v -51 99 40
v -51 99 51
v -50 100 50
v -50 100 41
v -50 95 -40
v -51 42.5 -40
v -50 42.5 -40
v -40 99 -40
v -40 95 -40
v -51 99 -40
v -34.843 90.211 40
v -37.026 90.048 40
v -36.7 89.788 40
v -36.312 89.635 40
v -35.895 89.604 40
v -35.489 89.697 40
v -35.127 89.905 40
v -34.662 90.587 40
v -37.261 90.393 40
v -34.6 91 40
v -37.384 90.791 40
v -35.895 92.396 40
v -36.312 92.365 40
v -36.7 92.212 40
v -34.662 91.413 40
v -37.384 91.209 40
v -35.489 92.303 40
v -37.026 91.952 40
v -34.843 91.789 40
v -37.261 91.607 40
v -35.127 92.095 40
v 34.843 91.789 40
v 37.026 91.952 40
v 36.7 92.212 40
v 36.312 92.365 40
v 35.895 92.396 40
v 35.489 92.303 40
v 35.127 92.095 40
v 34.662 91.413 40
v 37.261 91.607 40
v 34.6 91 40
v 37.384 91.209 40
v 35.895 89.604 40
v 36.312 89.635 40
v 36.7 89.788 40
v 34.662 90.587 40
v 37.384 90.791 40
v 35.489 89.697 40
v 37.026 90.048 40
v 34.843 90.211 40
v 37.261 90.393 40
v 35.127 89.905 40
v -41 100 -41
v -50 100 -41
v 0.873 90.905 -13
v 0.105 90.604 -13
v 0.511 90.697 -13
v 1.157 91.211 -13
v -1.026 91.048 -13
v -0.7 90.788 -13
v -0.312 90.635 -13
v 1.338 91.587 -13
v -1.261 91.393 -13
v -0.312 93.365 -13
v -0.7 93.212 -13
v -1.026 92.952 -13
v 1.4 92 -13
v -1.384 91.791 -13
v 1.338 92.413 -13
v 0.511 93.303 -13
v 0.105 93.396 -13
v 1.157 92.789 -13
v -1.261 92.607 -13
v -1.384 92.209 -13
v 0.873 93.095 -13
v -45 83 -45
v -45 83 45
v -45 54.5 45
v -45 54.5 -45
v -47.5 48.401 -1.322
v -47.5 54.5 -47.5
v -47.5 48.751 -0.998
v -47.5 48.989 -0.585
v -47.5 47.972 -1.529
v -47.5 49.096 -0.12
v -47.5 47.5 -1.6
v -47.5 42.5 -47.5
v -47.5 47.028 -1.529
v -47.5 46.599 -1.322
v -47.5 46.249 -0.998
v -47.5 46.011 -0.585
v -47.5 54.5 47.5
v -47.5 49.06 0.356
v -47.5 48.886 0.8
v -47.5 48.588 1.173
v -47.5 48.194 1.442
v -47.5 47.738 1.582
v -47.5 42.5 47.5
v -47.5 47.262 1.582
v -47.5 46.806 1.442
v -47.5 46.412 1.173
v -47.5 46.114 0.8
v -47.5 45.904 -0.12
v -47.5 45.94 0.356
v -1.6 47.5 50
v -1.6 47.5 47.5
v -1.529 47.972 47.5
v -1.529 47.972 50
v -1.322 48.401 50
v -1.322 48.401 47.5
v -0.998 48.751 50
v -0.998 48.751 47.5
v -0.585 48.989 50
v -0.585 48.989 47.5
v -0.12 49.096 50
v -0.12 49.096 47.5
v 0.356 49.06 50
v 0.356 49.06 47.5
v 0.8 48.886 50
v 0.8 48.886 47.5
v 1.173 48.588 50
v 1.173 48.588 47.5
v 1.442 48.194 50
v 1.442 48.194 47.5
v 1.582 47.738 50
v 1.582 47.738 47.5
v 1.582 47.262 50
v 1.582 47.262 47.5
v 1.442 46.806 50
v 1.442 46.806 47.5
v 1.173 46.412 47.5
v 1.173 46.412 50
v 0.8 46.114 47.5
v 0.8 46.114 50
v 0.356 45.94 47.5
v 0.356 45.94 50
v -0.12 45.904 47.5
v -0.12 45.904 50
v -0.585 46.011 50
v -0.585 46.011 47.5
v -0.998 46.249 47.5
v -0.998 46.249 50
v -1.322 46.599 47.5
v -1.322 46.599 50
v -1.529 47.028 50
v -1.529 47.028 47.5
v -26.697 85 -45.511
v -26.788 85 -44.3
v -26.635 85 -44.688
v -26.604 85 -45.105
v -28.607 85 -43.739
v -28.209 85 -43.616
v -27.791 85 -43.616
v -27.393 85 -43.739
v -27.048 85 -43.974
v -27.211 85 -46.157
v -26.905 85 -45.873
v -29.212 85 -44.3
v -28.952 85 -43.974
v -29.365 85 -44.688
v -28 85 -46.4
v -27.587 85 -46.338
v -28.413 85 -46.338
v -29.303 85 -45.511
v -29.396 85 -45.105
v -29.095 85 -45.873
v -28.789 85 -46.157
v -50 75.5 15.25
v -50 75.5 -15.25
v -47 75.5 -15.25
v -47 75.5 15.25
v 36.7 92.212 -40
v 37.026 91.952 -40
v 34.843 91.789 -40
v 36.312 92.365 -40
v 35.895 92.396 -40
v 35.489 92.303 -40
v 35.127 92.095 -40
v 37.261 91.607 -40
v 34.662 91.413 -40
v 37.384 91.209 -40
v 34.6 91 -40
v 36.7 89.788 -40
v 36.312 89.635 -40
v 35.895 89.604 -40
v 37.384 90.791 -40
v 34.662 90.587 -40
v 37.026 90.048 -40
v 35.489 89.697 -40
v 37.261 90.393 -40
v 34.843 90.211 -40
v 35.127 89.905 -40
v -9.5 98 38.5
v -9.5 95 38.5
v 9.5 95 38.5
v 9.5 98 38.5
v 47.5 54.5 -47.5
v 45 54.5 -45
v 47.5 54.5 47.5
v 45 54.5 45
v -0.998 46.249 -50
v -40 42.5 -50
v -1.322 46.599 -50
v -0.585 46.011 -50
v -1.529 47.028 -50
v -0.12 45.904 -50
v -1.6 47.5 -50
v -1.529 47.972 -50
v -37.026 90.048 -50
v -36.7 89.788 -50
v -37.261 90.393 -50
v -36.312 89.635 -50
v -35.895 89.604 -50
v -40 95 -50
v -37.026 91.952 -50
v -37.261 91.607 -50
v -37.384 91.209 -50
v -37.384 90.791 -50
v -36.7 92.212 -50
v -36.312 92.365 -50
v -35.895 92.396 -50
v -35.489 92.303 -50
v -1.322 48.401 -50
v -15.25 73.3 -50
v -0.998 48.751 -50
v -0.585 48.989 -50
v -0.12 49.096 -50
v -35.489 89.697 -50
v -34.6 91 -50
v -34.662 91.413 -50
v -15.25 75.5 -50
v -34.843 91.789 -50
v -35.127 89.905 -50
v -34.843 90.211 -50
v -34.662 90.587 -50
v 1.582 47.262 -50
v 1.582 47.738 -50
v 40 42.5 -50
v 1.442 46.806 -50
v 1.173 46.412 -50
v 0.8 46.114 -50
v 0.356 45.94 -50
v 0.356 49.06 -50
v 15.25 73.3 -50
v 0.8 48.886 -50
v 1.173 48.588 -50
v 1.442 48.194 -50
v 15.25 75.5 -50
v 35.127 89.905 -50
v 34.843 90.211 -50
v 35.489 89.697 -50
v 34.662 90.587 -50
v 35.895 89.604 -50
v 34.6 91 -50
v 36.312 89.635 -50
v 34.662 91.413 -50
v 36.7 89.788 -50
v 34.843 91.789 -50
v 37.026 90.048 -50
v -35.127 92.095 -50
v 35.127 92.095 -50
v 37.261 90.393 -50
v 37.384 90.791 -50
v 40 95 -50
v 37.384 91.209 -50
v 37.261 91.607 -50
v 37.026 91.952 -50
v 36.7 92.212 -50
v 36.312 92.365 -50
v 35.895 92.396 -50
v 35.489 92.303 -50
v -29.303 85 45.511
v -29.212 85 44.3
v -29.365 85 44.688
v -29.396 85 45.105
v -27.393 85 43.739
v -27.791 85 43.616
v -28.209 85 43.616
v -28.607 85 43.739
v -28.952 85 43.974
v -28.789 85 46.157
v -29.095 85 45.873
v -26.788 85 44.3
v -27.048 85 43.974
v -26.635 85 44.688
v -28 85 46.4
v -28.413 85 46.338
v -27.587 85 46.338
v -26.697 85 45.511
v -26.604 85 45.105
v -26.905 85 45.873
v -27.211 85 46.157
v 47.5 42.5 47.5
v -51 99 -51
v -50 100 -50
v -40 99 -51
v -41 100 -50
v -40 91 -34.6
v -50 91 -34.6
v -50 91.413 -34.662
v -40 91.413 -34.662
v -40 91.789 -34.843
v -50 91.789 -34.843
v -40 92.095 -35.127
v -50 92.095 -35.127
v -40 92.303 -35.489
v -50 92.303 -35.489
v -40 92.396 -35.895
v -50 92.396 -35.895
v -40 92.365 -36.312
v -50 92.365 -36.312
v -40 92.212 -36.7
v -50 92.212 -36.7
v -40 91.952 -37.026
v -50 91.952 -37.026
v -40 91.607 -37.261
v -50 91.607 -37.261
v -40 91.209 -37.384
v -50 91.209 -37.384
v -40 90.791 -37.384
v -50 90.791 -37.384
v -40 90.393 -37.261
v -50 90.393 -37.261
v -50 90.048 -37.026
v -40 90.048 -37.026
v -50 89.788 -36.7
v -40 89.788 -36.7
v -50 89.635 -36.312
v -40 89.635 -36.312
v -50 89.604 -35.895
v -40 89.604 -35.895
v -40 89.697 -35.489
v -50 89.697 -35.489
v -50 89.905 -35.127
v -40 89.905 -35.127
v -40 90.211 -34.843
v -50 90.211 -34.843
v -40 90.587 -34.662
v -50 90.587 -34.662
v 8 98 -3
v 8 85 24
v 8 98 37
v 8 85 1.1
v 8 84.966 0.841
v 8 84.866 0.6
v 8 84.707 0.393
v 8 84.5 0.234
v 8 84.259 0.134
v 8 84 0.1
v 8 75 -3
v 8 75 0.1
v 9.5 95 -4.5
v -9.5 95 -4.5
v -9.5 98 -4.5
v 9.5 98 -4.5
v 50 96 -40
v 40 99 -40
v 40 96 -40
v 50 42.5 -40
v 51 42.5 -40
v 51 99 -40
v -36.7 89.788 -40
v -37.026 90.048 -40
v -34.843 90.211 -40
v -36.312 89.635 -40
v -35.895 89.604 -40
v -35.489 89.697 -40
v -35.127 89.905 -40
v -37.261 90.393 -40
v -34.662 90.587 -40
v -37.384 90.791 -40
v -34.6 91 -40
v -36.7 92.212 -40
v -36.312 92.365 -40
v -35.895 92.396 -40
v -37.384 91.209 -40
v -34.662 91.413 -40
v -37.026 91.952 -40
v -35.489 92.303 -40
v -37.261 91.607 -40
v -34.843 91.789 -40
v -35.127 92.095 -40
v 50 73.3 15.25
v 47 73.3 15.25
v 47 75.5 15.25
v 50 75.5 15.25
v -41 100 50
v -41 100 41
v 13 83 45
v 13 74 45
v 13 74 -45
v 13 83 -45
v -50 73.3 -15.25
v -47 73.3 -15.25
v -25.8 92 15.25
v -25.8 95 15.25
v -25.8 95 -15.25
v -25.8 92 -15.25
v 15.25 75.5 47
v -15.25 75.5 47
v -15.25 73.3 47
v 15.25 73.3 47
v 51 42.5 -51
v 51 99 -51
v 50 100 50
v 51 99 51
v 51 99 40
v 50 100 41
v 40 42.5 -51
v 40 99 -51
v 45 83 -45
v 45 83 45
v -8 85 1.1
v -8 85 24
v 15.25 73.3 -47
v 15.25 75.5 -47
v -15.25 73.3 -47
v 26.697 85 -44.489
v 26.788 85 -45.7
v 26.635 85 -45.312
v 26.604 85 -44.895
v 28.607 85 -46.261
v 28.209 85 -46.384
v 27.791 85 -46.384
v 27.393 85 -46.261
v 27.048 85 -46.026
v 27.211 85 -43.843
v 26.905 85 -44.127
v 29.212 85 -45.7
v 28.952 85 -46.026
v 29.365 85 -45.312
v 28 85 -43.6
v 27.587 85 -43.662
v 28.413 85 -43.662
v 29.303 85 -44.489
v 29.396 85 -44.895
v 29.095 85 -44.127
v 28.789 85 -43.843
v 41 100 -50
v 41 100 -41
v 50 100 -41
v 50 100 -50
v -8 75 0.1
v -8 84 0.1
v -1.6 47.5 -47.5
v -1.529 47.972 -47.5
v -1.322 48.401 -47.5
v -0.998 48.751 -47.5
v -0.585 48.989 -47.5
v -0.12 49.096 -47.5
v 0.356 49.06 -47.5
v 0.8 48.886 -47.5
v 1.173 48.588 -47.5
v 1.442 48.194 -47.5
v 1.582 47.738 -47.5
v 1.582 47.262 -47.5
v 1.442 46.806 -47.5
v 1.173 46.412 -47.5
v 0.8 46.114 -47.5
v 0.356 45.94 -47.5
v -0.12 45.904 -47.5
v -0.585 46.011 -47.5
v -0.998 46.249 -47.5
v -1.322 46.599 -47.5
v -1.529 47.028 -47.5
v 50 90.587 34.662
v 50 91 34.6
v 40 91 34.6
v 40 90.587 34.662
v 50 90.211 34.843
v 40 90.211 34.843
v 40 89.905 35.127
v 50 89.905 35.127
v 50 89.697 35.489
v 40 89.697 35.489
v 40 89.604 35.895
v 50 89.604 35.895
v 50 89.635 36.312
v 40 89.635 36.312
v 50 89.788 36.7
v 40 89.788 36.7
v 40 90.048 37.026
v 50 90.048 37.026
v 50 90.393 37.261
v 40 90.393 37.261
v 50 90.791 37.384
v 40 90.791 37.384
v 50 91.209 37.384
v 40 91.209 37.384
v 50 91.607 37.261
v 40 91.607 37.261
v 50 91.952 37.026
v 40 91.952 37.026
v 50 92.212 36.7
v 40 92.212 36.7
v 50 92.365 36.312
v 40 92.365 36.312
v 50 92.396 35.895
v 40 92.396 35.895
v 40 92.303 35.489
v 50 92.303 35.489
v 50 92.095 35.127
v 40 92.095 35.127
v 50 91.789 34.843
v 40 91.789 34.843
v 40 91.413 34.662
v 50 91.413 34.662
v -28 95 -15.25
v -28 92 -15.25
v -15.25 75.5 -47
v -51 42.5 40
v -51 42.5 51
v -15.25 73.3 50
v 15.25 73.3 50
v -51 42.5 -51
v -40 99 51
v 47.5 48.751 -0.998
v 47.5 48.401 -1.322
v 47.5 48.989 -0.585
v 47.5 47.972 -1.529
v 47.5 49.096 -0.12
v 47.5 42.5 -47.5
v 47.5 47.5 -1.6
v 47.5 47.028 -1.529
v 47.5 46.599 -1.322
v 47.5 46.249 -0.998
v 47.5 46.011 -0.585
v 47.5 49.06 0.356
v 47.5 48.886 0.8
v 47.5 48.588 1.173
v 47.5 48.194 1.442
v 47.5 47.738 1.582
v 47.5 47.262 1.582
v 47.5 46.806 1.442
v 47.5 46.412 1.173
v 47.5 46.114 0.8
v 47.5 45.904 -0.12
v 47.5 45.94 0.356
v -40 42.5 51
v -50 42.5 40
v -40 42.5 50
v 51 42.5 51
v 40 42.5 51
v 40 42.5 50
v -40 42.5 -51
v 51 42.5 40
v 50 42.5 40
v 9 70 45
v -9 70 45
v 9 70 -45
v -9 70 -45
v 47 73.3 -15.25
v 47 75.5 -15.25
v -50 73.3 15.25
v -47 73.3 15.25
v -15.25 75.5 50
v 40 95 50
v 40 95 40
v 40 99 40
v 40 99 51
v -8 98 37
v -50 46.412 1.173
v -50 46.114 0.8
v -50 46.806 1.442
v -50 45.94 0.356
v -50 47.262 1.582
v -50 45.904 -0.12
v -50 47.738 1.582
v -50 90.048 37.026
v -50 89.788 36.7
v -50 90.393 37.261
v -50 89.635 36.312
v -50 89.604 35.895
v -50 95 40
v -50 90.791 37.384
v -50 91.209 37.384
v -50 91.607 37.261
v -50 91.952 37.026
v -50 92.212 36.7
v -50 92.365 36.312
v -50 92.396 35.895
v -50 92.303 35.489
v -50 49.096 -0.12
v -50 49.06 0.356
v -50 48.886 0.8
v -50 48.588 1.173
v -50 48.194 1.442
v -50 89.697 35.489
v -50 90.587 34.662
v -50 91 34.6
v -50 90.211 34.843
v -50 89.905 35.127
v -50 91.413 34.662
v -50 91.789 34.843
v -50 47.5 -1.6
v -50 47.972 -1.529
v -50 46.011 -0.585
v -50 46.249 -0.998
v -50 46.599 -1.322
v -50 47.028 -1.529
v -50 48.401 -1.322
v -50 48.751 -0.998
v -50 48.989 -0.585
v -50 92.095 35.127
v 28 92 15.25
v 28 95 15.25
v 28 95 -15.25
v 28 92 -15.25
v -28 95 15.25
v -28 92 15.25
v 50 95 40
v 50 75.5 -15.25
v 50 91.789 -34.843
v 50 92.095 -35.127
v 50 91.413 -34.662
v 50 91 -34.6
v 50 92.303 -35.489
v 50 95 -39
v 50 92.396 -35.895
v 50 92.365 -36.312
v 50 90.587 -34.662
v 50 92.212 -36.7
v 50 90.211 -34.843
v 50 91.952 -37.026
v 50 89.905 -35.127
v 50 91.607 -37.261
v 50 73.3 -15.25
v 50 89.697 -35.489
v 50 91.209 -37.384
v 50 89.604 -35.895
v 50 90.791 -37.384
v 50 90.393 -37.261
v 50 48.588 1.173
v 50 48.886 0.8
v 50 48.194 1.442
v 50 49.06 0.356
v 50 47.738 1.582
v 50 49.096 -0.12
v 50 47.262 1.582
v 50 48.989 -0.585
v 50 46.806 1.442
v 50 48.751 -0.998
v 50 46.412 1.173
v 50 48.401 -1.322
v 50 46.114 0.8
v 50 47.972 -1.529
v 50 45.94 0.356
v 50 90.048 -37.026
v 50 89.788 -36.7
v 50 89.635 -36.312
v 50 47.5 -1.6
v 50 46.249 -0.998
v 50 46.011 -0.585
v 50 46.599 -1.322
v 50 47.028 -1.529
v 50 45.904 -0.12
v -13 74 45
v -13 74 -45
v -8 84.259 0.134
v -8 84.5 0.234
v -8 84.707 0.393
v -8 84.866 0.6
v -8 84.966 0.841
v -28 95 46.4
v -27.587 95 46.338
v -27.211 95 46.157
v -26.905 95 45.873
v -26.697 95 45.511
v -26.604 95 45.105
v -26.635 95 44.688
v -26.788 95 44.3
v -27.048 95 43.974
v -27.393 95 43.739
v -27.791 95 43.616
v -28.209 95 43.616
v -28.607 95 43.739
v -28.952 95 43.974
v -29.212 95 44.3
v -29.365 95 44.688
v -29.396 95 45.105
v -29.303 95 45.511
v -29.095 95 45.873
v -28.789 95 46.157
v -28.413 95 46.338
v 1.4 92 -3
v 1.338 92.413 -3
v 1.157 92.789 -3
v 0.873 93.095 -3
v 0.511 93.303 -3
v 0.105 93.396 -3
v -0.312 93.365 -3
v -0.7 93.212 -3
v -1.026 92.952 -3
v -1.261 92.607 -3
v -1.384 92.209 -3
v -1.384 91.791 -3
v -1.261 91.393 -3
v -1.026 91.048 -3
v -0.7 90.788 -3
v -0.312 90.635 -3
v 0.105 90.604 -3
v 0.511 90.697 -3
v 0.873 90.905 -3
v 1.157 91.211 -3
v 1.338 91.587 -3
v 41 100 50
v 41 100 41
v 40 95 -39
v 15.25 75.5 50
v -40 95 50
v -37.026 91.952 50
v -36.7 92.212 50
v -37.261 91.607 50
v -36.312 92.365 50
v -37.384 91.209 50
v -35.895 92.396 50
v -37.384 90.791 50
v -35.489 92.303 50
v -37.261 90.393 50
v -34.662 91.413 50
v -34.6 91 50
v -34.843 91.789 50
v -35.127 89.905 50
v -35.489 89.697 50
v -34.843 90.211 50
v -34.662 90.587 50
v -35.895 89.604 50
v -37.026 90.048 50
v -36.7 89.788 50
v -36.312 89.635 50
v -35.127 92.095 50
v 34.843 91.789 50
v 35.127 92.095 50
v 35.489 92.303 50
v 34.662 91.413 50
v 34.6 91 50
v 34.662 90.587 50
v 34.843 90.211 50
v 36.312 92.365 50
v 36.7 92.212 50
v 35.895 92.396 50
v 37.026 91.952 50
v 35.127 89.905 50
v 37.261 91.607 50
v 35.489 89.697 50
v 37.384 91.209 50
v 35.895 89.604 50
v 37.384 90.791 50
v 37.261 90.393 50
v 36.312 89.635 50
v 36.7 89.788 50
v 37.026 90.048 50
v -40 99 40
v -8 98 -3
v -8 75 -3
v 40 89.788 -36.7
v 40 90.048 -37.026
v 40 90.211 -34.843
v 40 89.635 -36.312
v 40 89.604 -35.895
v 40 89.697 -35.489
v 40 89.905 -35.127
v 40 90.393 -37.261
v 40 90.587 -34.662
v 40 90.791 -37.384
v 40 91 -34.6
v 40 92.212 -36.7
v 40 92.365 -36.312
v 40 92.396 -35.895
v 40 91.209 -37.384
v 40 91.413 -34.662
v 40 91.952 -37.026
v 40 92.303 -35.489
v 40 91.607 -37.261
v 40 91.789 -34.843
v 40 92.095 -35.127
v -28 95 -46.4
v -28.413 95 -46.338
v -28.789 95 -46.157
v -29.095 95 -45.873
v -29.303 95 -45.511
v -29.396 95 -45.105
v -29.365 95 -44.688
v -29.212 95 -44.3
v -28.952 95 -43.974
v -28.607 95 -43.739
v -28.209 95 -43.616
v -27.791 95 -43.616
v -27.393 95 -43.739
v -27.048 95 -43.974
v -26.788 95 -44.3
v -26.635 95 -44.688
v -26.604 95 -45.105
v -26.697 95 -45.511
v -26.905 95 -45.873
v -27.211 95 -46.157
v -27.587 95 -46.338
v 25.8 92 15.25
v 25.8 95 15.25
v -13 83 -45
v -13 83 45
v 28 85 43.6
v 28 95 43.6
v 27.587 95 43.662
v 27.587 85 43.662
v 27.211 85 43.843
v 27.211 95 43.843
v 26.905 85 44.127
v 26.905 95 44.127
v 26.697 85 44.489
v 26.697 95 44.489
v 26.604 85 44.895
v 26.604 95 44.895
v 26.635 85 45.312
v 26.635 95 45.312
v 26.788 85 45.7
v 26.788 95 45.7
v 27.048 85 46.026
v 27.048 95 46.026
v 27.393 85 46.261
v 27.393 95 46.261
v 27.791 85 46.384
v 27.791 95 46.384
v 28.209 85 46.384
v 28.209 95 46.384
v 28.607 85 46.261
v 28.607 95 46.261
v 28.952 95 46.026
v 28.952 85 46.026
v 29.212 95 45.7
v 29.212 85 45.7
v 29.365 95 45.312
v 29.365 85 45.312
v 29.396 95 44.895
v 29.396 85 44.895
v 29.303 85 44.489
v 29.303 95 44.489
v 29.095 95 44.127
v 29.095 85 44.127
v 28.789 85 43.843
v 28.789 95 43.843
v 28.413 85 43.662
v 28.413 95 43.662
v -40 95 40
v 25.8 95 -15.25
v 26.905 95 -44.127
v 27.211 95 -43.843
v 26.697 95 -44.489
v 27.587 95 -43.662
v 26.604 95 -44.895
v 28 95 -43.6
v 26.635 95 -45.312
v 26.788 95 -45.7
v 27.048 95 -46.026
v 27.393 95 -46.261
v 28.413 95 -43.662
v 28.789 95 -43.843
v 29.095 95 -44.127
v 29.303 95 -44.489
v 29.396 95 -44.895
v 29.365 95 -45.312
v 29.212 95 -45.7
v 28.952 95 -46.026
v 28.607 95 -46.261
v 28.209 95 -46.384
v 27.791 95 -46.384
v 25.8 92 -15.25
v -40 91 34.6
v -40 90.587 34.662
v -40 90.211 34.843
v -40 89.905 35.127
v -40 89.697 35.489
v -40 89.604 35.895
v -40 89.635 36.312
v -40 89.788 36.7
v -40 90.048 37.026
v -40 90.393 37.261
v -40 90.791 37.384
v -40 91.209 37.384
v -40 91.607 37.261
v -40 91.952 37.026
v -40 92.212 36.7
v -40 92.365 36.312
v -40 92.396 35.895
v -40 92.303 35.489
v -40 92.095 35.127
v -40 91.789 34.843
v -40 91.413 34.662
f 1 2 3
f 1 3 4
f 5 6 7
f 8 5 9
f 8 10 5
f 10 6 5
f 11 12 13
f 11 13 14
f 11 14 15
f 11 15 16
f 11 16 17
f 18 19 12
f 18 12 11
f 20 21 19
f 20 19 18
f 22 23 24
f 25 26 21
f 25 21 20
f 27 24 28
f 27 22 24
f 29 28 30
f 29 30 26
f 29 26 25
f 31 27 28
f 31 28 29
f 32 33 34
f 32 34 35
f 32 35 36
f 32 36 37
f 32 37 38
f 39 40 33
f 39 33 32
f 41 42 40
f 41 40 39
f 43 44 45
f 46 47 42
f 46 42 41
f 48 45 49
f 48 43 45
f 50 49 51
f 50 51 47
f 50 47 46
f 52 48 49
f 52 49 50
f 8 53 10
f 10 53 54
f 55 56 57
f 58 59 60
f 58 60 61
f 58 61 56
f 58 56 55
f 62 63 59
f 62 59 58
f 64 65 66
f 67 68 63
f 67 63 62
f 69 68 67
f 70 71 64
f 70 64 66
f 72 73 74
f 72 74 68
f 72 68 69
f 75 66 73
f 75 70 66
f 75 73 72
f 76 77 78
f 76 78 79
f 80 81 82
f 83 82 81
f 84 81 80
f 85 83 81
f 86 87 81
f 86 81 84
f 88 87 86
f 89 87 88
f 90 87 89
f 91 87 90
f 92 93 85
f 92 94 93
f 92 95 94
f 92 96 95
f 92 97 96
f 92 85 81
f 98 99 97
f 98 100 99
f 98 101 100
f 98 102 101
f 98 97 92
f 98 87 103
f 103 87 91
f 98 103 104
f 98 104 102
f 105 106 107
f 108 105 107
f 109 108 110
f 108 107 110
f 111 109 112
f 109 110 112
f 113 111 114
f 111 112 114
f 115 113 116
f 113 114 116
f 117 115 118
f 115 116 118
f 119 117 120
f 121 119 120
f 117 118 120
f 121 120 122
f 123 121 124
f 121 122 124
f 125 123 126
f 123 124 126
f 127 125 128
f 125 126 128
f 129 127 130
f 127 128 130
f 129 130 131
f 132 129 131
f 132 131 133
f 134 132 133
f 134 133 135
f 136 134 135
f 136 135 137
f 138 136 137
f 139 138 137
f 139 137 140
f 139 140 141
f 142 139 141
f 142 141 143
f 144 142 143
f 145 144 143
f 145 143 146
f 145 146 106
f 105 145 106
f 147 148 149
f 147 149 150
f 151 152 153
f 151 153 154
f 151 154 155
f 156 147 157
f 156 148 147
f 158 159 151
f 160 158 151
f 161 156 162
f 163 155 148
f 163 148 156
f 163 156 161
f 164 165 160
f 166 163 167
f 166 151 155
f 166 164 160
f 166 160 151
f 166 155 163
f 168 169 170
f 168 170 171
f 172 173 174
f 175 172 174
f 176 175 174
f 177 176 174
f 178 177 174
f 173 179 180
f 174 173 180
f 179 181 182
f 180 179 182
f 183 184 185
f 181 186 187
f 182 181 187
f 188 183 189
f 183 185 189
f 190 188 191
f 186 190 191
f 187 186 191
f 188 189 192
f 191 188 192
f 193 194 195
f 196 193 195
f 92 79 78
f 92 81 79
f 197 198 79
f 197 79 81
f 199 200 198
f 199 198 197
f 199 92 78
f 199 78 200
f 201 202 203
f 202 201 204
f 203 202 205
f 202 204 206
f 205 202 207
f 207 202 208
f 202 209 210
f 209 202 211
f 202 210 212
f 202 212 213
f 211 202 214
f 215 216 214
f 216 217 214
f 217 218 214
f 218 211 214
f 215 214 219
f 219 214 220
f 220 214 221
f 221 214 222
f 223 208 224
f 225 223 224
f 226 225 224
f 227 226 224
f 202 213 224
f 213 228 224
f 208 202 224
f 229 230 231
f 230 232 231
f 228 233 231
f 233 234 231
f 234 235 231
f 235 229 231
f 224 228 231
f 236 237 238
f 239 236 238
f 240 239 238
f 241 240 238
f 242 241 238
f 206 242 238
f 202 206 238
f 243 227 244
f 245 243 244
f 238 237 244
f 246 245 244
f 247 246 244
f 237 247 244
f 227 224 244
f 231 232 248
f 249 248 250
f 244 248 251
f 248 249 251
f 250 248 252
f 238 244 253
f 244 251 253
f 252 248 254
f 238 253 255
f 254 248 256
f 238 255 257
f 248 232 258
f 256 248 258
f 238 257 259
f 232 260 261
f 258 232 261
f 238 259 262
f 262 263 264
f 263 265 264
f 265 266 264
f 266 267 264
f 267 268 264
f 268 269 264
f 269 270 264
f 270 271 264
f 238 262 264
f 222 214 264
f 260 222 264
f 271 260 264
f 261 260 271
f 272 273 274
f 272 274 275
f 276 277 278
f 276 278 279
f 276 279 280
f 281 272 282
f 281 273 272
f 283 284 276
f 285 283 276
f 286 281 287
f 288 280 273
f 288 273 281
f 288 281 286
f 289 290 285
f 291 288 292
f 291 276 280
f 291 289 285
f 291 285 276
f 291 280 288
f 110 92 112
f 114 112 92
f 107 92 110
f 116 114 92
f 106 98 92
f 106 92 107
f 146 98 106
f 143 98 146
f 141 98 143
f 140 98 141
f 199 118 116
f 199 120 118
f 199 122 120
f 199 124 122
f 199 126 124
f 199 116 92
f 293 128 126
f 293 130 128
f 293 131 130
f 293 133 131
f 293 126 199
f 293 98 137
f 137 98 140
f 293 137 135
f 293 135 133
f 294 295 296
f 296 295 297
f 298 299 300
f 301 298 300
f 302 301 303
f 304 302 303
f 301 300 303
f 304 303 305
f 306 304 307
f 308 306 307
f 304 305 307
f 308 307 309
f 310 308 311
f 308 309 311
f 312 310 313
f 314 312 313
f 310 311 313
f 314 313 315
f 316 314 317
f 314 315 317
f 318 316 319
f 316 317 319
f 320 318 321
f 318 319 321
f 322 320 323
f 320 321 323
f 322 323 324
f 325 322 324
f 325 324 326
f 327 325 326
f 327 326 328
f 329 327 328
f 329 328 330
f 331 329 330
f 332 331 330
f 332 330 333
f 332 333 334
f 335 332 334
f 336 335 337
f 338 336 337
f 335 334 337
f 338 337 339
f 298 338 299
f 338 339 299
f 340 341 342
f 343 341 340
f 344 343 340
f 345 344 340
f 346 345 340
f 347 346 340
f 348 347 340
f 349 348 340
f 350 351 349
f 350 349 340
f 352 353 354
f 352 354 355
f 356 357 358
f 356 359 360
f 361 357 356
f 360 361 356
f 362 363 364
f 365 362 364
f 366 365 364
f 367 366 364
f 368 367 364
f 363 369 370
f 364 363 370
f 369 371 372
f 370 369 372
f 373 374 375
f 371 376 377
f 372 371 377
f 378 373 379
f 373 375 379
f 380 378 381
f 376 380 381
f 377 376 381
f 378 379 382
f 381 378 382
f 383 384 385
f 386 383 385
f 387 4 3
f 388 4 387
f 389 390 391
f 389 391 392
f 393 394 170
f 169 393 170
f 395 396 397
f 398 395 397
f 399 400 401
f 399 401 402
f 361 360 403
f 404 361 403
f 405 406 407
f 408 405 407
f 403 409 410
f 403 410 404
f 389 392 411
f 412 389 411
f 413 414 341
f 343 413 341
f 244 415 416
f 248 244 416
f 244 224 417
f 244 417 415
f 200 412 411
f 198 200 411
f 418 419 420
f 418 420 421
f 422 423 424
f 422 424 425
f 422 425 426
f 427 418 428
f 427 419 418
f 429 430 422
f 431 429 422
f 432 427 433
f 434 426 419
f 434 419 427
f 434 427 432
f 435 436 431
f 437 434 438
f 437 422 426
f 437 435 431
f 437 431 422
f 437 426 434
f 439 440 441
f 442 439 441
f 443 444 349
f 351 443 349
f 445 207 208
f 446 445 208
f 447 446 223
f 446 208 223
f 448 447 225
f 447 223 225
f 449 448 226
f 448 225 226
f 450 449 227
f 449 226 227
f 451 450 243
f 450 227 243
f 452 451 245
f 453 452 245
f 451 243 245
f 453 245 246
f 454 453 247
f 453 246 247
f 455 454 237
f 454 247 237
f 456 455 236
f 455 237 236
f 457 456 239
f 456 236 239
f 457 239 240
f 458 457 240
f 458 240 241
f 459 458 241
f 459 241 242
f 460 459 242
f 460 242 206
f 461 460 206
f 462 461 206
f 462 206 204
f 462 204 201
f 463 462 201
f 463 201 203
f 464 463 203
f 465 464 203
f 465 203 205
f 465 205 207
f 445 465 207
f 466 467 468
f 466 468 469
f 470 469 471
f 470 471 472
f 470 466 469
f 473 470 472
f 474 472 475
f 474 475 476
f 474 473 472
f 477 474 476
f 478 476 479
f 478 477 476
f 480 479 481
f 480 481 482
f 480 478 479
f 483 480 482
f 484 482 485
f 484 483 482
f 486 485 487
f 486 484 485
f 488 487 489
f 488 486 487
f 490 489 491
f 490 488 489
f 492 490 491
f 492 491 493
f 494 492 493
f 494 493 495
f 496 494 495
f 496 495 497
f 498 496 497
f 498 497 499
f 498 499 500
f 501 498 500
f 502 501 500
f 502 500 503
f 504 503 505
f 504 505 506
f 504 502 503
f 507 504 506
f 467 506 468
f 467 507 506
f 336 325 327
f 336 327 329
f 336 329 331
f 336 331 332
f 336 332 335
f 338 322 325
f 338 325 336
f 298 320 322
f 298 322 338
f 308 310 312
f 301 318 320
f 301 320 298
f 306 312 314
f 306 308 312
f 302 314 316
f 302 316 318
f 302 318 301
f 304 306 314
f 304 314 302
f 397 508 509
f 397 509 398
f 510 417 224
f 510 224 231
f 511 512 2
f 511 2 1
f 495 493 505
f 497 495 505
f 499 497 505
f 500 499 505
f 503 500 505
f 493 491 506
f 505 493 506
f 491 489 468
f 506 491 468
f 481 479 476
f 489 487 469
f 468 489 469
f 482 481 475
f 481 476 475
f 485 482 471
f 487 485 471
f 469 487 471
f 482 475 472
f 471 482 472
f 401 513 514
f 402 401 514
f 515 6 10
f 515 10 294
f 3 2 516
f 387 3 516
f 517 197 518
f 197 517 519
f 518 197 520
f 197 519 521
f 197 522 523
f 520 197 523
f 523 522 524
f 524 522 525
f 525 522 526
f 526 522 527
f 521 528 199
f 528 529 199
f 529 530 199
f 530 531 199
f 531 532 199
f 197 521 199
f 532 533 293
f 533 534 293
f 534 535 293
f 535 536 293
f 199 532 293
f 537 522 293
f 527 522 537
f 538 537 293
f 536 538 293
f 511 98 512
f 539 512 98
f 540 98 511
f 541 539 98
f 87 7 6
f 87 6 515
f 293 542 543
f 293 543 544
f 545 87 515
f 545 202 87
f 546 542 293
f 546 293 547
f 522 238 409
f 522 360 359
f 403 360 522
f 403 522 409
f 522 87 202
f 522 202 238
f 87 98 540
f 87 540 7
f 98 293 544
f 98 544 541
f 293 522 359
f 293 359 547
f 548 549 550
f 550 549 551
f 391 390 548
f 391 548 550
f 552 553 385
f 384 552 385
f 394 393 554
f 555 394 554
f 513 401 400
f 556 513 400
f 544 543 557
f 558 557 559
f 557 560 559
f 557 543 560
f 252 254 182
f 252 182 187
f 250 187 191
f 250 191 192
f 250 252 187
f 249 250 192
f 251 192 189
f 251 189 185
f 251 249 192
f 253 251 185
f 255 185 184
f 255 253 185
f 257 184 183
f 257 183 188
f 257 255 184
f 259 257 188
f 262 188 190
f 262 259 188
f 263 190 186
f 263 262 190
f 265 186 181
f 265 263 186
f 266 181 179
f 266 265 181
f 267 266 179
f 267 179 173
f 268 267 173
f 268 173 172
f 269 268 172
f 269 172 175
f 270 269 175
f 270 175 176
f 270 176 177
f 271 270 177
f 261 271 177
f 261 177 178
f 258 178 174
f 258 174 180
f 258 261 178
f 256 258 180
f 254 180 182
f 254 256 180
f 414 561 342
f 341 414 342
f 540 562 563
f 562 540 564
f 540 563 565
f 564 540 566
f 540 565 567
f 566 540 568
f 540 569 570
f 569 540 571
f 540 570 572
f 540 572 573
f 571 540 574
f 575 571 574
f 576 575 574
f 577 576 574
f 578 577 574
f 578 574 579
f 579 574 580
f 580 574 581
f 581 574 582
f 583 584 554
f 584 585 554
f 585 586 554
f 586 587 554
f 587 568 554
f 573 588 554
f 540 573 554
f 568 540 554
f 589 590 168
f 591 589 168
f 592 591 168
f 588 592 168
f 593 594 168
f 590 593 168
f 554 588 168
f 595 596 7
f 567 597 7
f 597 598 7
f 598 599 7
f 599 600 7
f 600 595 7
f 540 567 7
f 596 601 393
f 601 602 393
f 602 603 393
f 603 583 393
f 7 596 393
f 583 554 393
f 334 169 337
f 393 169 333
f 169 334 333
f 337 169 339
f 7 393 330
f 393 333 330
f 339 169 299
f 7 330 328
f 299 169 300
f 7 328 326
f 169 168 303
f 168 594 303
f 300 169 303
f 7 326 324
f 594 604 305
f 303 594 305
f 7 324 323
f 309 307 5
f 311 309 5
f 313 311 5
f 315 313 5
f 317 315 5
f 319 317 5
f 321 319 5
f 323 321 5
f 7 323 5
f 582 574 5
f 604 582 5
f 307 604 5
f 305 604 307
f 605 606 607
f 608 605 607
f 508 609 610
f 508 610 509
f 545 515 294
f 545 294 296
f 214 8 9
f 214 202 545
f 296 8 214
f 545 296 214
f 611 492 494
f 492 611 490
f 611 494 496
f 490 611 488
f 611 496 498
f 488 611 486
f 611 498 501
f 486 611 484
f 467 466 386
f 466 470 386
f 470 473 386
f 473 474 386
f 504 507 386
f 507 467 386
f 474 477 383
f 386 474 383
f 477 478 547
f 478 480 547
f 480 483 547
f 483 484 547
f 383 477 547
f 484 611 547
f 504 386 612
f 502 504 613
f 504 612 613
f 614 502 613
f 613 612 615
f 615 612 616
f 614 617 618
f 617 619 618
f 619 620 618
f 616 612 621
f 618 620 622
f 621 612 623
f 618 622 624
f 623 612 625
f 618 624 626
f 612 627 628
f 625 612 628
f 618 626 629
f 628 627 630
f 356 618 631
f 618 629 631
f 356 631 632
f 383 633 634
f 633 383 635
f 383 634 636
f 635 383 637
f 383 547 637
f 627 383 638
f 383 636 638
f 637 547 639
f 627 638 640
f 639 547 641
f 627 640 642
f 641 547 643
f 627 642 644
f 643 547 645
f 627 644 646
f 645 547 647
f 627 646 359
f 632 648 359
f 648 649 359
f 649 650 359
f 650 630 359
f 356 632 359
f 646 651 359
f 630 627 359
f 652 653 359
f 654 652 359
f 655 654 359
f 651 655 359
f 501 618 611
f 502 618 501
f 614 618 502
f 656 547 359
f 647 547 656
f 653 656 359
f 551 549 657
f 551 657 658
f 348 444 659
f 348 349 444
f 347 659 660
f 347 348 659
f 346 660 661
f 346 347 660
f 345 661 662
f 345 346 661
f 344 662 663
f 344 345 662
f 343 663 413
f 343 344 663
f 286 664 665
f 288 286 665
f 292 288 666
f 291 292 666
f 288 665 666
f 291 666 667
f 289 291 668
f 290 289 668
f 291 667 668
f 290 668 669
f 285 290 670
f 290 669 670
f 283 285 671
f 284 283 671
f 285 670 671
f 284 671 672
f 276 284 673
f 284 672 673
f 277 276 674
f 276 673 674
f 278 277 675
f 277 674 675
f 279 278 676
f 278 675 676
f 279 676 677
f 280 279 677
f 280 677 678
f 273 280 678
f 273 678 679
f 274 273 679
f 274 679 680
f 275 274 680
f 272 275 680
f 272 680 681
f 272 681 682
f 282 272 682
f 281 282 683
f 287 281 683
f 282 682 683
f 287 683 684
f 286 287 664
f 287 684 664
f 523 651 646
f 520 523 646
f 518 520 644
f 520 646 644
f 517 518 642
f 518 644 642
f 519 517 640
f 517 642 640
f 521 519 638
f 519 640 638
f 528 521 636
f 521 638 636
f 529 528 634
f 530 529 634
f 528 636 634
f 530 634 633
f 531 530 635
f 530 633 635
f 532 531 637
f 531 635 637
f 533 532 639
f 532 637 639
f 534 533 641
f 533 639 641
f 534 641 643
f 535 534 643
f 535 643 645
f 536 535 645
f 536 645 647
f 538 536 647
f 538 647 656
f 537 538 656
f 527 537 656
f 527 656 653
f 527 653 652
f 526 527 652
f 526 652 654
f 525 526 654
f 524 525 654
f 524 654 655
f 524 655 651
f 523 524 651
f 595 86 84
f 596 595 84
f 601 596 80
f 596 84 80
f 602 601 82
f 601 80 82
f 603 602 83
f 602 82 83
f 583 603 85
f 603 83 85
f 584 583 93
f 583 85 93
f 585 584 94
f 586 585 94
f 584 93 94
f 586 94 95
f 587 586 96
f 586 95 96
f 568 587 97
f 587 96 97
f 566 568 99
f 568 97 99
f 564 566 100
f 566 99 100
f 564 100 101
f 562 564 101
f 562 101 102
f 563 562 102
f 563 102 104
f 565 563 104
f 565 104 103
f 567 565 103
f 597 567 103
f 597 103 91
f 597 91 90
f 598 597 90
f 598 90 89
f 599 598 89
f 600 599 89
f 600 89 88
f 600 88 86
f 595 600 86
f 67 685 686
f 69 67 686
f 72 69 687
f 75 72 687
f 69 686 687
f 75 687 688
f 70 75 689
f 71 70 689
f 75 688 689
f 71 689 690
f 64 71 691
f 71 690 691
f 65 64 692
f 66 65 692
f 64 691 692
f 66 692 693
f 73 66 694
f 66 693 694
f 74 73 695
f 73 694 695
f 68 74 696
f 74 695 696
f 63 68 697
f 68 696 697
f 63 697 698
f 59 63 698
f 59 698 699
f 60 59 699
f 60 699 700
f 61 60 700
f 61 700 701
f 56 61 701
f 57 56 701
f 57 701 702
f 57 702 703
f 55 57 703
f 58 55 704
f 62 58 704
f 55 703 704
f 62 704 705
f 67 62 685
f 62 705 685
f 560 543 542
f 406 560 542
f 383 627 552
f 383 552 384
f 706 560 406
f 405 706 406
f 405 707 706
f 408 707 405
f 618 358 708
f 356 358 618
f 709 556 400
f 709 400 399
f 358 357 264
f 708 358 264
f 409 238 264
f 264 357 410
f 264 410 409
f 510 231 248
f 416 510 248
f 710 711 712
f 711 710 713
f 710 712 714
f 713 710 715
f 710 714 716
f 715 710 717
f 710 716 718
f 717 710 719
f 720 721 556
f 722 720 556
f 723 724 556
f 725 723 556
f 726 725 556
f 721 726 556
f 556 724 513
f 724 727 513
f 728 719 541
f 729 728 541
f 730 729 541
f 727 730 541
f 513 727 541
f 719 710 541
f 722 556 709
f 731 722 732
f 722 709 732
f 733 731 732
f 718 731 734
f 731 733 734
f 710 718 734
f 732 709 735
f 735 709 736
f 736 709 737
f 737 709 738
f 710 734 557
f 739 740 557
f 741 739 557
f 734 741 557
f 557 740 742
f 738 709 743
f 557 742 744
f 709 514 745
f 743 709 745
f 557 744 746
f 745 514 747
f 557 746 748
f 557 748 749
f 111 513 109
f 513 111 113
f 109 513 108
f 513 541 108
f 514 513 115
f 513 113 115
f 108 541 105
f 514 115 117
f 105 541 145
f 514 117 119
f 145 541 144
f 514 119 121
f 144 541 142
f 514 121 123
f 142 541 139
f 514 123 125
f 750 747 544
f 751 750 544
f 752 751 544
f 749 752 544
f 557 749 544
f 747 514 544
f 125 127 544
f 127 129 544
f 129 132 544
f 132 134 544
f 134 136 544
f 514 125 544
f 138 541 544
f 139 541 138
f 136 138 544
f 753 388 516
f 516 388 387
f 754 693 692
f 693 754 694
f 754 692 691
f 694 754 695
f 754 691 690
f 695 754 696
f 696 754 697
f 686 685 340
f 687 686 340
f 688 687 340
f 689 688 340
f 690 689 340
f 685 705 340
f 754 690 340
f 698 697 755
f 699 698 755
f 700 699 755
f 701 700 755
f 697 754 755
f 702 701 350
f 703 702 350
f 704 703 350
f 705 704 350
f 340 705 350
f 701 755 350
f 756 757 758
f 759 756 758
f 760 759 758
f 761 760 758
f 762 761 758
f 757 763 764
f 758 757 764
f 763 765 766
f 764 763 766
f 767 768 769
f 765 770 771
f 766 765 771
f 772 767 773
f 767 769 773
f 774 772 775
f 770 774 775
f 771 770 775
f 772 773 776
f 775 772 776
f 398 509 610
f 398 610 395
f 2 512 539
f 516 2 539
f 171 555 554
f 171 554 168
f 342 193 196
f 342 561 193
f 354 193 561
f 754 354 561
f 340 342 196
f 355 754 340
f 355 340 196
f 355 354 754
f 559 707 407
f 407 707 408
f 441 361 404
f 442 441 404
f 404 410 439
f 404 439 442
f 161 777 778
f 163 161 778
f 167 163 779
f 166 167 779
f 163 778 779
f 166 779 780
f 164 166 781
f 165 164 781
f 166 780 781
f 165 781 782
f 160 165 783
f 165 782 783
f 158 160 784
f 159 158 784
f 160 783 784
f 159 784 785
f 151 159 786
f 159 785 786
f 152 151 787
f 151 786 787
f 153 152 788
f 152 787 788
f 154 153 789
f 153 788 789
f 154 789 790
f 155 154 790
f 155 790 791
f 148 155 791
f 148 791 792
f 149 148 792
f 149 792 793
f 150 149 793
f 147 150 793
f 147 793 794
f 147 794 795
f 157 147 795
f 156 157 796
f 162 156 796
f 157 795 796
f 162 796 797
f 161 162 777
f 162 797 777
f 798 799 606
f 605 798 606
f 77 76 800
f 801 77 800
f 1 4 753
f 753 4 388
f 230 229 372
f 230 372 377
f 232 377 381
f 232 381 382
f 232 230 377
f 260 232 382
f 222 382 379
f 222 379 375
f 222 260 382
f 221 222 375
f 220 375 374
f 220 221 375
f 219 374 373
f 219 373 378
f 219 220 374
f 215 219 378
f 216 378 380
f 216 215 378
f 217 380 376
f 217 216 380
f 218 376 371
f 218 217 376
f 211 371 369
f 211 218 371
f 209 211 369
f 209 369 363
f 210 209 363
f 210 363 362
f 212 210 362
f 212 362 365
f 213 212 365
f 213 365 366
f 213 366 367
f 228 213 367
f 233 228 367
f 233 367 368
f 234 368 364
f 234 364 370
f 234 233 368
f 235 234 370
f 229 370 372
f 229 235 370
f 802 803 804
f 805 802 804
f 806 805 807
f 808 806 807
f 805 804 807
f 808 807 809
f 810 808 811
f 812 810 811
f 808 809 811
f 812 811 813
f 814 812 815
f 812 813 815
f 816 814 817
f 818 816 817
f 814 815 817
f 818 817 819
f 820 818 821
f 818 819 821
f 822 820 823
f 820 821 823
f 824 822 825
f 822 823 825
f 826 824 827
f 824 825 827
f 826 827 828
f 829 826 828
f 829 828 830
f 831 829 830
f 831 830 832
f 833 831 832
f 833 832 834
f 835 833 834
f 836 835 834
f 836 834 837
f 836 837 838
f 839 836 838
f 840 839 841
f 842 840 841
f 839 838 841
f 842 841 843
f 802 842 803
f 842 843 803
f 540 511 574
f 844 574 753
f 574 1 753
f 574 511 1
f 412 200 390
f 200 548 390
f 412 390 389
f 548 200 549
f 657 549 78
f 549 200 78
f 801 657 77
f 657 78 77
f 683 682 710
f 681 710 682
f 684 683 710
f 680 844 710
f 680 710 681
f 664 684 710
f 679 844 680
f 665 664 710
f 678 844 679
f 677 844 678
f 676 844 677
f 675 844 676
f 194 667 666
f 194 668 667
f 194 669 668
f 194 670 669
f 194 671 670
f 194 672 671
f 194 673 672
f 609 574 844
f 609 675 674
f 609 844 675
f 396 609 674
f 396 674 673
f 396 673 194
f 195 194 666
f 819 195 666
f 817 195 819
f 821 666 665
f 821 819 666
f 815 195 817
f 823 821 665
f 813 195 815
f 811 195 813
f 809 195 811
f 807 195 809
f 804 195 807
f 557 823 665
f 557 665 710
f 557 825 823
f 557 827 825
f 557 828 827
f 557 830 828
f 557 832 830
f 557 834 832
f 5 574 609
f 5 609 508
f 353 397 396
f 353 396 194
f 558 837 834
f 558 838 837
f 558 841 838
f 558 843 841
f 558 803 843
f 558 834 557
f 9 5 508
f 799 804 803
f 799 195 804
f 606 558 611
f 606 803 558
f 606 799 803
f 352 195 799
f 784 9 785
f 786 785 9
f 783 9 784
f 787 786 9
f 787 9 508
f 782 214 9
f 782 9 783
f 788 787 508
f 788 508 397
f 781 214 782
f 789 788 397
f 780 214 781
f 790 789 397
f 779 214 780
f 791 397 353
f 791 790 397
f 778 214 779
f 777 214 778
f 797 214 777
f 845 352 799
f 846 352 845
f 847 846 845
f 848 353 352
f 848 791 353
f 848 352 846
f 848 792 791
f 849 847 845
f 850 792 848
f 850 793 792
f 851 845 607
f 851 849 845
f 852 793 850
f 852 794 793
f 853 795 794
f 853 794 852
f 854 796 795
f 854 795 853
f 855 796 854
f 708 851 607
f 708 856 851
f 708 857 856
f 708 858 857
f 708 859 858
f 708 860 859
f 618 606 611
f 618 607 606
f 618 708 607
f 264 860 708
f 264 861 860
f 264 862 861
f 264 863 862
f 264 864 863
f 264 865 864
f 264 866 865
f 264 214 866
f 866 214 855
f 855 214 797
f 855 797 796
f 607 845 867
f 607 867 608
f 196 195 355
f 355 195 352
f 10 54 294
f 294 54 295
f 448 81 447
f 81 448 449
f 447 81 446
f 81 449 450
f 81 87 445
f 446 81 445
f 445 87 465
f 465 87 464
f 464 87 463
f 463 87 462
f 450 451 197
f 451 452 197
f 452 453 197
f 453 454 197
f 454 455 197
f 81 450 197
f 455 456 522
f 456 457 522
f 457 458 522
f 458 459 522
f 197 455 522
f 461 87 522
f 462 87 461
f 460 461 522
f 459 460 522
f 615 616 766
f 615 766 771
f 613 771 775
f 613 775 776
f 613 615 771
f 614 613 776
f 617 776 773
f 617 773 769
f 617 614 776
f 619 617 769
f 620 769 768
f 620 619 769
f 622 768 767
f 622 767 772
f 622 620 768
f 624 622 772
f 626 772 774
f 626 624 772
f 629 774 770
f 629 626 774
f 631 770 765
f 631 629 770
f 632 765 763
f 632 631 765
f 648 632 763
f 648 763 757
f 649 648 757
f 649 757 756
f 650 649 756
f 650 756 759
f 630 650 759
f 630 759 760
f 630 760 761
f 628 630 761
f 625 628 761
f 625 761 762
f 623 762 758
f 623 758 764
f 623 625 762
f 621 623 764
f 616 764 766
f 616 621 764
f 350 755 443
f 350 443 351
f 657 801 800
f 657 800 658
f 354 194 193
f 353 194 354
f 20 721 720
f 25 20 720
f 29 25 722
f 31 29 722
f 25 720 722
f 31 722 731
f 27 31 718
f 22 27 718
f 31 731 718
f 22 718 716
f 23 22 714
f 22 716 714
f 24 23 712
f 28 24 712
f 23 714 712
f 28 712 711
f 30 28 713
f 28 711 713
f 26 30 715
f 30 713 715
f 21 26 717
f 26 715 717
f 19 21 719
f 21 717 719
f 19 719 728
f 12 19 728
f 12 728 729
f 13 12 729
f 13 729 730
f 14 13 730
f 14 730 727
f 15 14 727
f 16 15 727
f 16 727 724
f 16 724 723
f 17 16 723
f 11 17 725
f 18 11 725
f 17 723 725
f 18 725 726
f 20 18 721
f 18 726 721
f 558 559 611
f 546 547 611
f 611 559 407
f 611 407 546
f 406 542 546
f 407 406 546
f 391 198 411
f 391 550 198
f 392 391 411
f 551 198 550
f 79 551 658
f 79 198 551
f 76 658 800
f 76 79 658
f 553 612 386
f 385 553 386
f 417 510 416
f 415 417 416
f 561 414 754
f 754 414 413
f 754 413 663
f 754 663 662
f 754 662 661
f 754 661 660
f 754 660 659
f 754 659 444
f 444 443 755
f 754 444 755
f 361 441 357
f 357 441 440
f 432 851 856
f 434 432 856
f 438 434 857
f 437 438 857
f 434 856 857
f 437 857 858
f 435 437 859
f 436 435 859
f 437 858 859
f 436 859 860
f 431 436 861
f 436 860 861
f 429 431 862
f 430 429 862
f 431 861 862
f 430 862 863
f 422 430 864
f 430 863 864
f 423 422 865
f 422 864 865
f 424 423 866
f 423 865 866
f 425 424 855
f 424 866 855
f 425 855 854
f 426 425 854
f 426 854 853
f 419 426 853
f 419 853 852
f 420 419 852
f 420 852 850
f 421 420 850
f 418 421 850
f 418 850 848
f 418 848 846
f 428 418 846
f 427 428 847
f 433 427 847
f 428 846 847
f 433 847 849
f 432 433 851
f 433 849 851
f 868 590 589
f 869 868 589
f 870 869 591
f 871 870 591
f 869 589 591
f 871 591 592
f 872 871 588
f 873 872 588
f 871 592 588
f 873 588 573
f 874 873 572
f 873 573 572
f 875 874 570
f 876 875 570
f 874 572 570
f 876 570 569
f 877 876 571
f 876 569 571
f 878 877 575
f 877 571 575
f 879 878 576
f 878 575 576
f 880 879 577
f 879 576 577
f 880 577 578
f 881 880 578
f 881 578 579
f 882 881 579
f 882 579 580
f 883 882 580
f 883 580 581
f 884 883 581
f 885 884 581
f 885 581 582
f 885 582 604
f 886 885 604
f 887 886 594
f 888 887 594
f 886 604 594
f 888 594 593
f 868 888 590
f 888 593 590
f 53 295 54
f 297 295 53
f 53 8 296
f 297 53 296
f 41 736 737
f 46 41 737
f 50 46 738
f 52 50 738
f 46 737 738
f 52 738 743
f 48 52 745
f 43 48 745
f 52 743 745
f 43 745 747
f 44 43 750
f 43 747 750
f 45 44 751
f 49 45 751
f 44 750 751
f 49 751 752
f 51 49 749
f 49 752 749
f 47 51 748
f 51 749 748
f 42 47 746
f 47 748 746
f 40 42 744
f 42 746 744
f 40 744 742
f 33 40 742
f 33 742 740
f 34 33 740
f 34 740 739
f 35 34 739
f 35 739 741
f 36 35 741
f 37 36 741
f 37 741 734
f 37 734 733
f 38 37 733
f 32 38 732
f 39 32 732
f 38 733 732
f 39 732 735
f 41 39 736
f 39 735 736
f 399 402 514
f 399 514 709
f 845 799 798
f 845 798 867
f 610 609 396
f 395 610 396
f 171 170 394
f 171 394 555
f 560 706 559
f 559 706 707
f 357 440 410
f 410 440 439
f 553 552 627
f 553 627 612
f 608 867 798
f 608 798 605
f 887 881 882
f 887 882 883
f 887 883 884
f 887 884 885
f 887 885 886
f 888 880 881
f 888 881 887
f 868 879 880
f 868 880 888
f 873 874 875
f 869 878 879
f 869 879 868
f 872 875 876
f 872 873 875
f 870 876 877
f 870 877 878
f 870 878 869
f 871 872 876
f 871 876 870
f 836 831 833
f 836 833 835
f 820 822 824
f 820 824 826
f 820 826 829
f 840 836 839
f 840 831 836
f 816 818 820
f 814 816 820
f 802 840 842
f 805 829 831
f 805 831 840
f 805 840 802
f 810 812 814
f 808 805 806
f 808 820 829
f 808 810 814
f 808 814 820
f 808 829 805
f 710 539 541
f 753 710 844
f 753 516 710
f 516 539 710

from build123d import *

# Parameters (mm, degrees)
SKETCH1_W                       = 100
SKETCH1_H                       = 100
BOSS_EXTRUDE1_DEPTH             = 95
SKETCH2_W                       = 10
SKETCH2_H                       = 10
BOSS_EXTRUDE2_DEPTH             = 105
SKETCH3_R                       = 1.4
CUT_EXTRUDE1_DEPTH              = 10
SKETCH4_W                       = 11
SKETCH4_H                       = 11
BOSS_EXTRUDE3_DEPTH             = 105
SKETCH5_R                       = 1.4
CUT_EXTRUDE2_DEPTH              = 10
SKETCH6_R                       = 1.4
CUT_EXTRUDE3_DEPTH              = 10
CHAMFER1_SIZE                   = 1
SKETCH7_W                       = 19
SKETCH7_H                       = 43
SKETCH7_W_2                     = 16
SKETCH7_H_2                     = 40
BOSS_EXTRUDE4_DEPTH             = 3
SKETCH8_W                       = 16
SKETCH8_H                       = 40
CUT_EXTRUDE4_DEPTH              = 10
CHAMFER2_SIZE                   = 13
SKETCH9_W                       = 16
SKETCH9_H                       = 3.1
CUT_EXTRUDE5_DEPTH              = 10
FILLET1_R                       = 1
SKETCH10_R                      = 1.4
CUT_EXTRUDE6_DEPTH              = 10
SKETCH11_R                      = 5
BOSS_EXTRUDE5_DEPTH             = 3
SKETCH12_W                      = 30.5
SKETCH12_H                      = 2.2
CUT_EXTRUDE7_DEPTH              = 3
SKETCH13_W                      = 30.5
SKETCH13_H                      = 2.2
CUT_EXTRUDE8_DEPTH              = 3
SKETCH14_W                      = 2.2
SKETCH14_H                      = 30.5
CUT_EXTRUDE9_DEPTH              = 3
CUT_EXTRUDE10_DEPTH             = 45
CUT_EXTRUDE10_DEPTH_BACK        = 45
SKETCH15_W                      = 90
SKETCH15_H                      = 58
CUT_EXTRUDE11_REACH             = 125.296
CUT_EXTRUDE11_DIRECTION_2_REACH = 125.296
CHAMFER3_SIZE                   = 4
SKETCH17_W                      = 102
SKETCH17_H                      = 53.035118915
CUT_EXTRUDE12_DEPTH             = 152.673992497
SKETCH19_W                      = 95
SKETCH19_H                      = 95
CUT_EXTRUDE14_DEPTH             = 12
SKETCH20_R                      = 1.6
CUT_EXTRUDE15_DEPTH             = 152.003311222
SKETCH21_R                      = 1.6
CUT_EXTRUDE16_DEPTH             = 152.003311222


with BuildPart() as part:
    # Sketch1 → Boss-Extrude1 (new body)
    with BuildSketch(Plane(origin=(0, 0, 0), x_dir=(1, 0, 0), z_dir=(0, 1, 0))):
        Rectangle(SKETCH1_W, SKETCH1_H)
    extrude(amount=BOSS_EXTRUDE1_DEPTH)

    # Sketch2 → Boss-Extrude2 (add)
    with BuildSketch(Plane(origin=(0, 100, 0), x_dir=(1, 0, 0), z_dir=(0, 1, 0))):
        with Locations((-45, 45)):
            Rectangle(SKETCH2_W, SKETCH2_H)
        with Locations((45, 45)):
            Rectangle(SKETCH2_W, SKETCH2_H)
        with Locations((45, -45)):
            Rectangle(SKETCH2_W, SKETCH2_H)
        with Locations((-45, -45)):
            Rectangle(SKETCH2_W, SKETCH2_H)
    extrude(amount=-BOSS_EXTRUDE2_DEPTH)

    # Sketch3 → Cut-Extrude1 (cut)
    with BuildSketch(Plane(origin=(0, 95, 0), x_dir=(1, 0, 0), z_dir=(0, 1, 0))):
        with Locations(Location((-28, -45, 0), (0, 0, 270))):
            Circle(SKETCH3_R)
        with Locations(Location((28, -45, 0), (0, 0, 90))):
            Circle(SKETCH3_R)
        with Locations(Location((28, 45, 0), (0, 0, 270))):
            Circle(SKETCH3_R)
        with Locations(Location((-28, 45, 0), (0, 0, 90))):
            Circle(SKETCH3_R)
    cut_extrude1 = extrude(amount=-CUT_EXTRUDE1_DEPTH, mode=Mode.SUBTRACT)

    # Sketch4 → Boss-Extrude3 (add)
    with BuildSketch(Plane(origin=(0, 100, 0), x_dir=(1, 0, 0), z_dir=(0, 1, 0))):
        with Locations((-45.5, 45.5)):
            Rectangle(SKETCH4_W, SKETCH4_H)
        with Locations((45.5, 45.5)):
            Rectangle(SKETCH4_W, SKETCH4_H)
        with Locations((45.5, -45.5)):
            Rectangle(SKETCH4_W, SKETCH4_H)
        with Locations((-45.5, -45.5)):
            Rectangle(SKETCH4_W, SKETCH4_H)
    extrude(amount=-BOSS_EXTRUDE3_DEPTH)

    # Sketch5 → Cut-Extrude2 (cut)
    with BuildSketch(Plane.XY.offset(50)):
        with Locations((-36, 91)):
            Circle(SKETCH5_R)
        with Locations(Location((36, 91, 0), (0, 0, 180))):
            Circle(SKETCH5_R)
        with Locations((36, 4)):
            Circle(SKETCH5_R)
        with Locations(Location((-36, 4, 0), (0, 0, 180))):
            Circle(SKETCH5_R)
    cut_extrude2 = extrude(amount=-CUT_EXTRUDE2_DEPTH, mode=Mode.SUBTRACT)

    # Mirror1: Cut-Extrude2 across plane
    add(cut_extrude2.mirror(Plane.XY), mode=Mode.SUBTRACT)

    # Sketch6 → Cut-Extrude3 (cut)
    with BuildSketch(Plane.ZY.offset(50)):
        with Locations((-36, 91)):
            Circle(SKETCH6_R)
        with Locations(Location((36, 91, 0), (0, 0, 180))):
            Circle(SKETCH6_R)
        with Locations((36, 4)):
            Circle(SKETCH6_R)
        with Locations(Location((-36, 4, 0), (0, 0, 180))):
            Circle(SKETCH6_R)
    cut_extrude3 = extrude(amount=-CUT_EXTRUDE3_DEPTH, mode=Mode.SUBTRACT)

    # Mirror2: Cut-Extrude3 across plane
    add(cut_extrude3.mirror(Plane(origin=(0, 0, 0), x_dir=(0, 0, 1), z_dir=(1, 0, 0))), mode=Mode.SUBTRACT)

    # Mirror3: Cut-Extrude1 across plane
    add(cut_extrude1.mirror(Plane.ZX.offset(47.5)), mode=Mode.SUBTRACT)

    # Chamfer1
    chamfer1_edges = [part.edges().sort_by_distance(p)[0] for p in [
        (-45.5, -5, 51),
        (-51, -5, 45.5),
        (-51, 100, 45.5),
        (-45.5, 100, 51),
        (51, -5, 45.5),
        (45.5, -5, 51),
        (45.5, 100, 51),
        (51, 100, 45.5),
        (45.5, -5, -51),
        (51, -5, -45.5),
        (51, 100, -45.5),
        (45.5, 100, -51),
        (-51, -5, -45.5),
        (-45.5, -5, -51),
        (-45.5, 100, -51),
        (-51, 100, -45.5),
        (-45.5, -5, 40),
        (-40, -5, 45.5),
        (-40, 100, 45.5),
        (-45.5, 100, 40),
        (40, -5, 45.5),
        (45.5, -5, 40),
        (45.5, 100, 40),
        (40, 100, 45.5),
        (45.5, -5, -40),
        (40, -5, -45.5),
        (45, 95, -40),
        (40, 100, -45.5),
        (45.5, 100, -40),
        (-40, -5, -45.5),
        (-45.5, -5, -40),
        (-45.5, 100, -40),
        (-40, 100, -45.5),
    ]]
    chamfer(chamfer1_edges, length=CHAMFER1_SIZE)

    # Sketch7 → Boss-Extrude4 (add)
    with BuildSketch(Plane(origin=(0, 95, 0), x_dir=(1, 0, 0), z_dir=(0, 1, 0))):
        with Locations((0, -17)):
            Rectangle(SKETCH7_W, SKETCH7_H)
        with Locations((0, -17)):
            Rectangle(SKETCH7_W_2, SKETCH7_H_2, mode=Mode.SUBTRACT)
    extrude(amount=BOSS_EXTRUDE4_DEPTH)

    # Sketch8 → Cut-Extrude4 (cut)
    with BuildSketch(Plane(origin=(0, 95, 0), x_dir=(1, 0, 0), z_dir=(0, 1, 0))):
        with Locations((0, -17)):
            Rectangle(SKETCH8_W, SKETCH8_H)
    extrude(amount=-CUT_EXTRUDE4_DEPTH, mode=Mode.SUBTRACT)

    # Chamfer2
    chamfer2_edges = [part.edges().sort_by_distance(p)[0] for p in [
        (0, 85, 37),
    ]]
    chamfer(chamfer2_edges, length=CHAMFER2_SIZE - 0.0001)  # a hair under: the kernel refuses the full size

    # Sketch9 → Cut-Extrude5 (cut)
    with BuildSketch(Plane(origin=(0, 85, 0), x_dir=(1, 0, 0), z_dir=(0, 1, 0))):
        with Locations((0, 1.45)):
            Rectangle(SKETCH9_W, SKETCH9_H)
    extrude(amount=-CUT_EXTRUDE5_DEPTH, mode=Mode.SUBTRACT)

    # Fillet1
    fillet1_edges = [part.edges().sort_by_distance(p)[0] for p in [
        (0, 85, 0.1),
    ]]
    fillet(fillet1_edges, radius=FILLET1_R)

    # Sketch10 → Cut-Extrude6 (cut)
    with BuildSketch(Plane.XY.offset(-3)):
        with Locations((0, 92)):
            Circle(SKETCH10_R)
    extrude(amount=-CUT_EXTRUDE6_DEPTH, mode=Mode.SUBTRACT)

    # Sketch11 → Boss-Extrude5 (add)
    with BuildSketch(Plane.XZ):
        with Locations(Location((0, -15, 0), (0, 0, 90))):
            Circle(SKETCH11_R)
    extrude(amount=BOSS_EXTRUDE5_DEPTH)

    # Sketch12 → Cut-Extrude7 (cut)
    with BuildSketch(Plane.ZY.offset(50)):
        with Locations((0, 74.4)):
            Rectangle(SKETCH12_W, SKETCH12_H)
        with Locations((0, 20.6)):
            Rectangle(SKETCH12_W, SKETCH12_H)
    cut_extrude7 = extrude(amount=-CUT_EXTRUDE7_DEPTH, mode=Mode.SUBTRACT)

    # Mirror4: Cut-Extrude7 across plane
    add(cut_extrude7.mirror(Plane(origin=(0, 0, 0), x_dir=(0, 0, 1), z_dir=(1, 0, 0))), mode=Mode.SUBTRACT)

    # Sketch13 → Cut-Extrude8 (cut)
    with BuildSketch(Plane.XY.offset(50)):
        with Locations((0, 74.4)):
            Rectangle(SKETCH13_W, SKETCH13_H)
        with Locations((0, 20.6)):
            Rectangle(SKETCH13_W, SKETCH13_H)
    cut_extrude8 = extrude(amount=-CUT_EXTRUDE8_DEPTH, mode=Mode.SUBTRACT)

    # Mirror5: Cut-Extrude8 across plane
    add(cut_extrude8.mirror(Plane.XY), mode=Mode.SUBTRACT)

    # Sketch14 → Cut-Extrude9 (cut)
    with BuildSketch(Plane(origin=(0, 95, 0), x_dir=(1, 0, 0), z_dir=(0, 1, 0))):
        with Locations((26.9, 0)):
            Rectangle(SKETCH14_W, SKETCH14_H)
        with Locations((-26.9, 0)):
            Rectangle(SKETCH14_W, SKETCH14_H)
    cut_extrude9 = extrude(amount=-CUT_EXTRUDE9_DEPTH, mode=Mode.SUBTRACT)

    # Mirror6: Cut-Extrude9 across plane
    add(cut_extrude9.mirror(Plane.ZX.offset(47.5)), mode=Mode.SUBTRACT)

    # Sketch15 → Cut-Extrude10 (cut, two sides: drawn at the far end of the back side and taken through both)
    with BuildSketch(Plane(origin=(0, 0, 0), x_dir=(0, 0, -1), z_dir=(1, 0, 0)).offset(-CUT_EXTRUDE10_DEPTH_BACK)):
        with Locations((0, 41)):
            Rectangle(SKETCH15_W, SKETCH15_H)
    extrude(amount=CUT_EXTRUDE10_DEPTH + CUT_EXTRUDE10_DEPTH_BACK, mode=Mode.SUBTRACT)

    # Cut-Extrude11: up to this face of the body (flat: up to its plane)
    cut_extrude11_end = Plane(part.part.faces().sort_by_distance((0, 41, 45))[0])
    # Sketch16 → Cut-Extrude11 (cut, up to the picked face)
    with BuildSketch(Plane.XY, mode=Mode.PRIVATE) as cut_extrude11_sk1:
        Polygon((45, 57.006357685), (-45, 57.006357685), (-45, 83), (-13, 83), (-13, 67.006357685), (13, 67.006357685), (13, 83), (45, 83), align=None)
    cut_extrude11_tool1 = split(extrude(cut_extrude11_sk1.sketch, amount=CUT_EXTRUDE11_REACH, mode=Mode.PRIVATE), bisect_by=cut_extrude11_end, keep=Keep.BOTH, mode=Mode.PRIVATE)
    add(cut_extrude11_tool1.solids().sort_by(Axis((0, 57.943143, 0), (0, 0, 1)))[0], mode=Mode.SUBTRACT)

    # Cut-Extrude11 direction 2: up to this face of the body (flat: up to its plane)
    cut_extrude11_direction_2_end = Plane(part.part.faces().sort_by_distance((0, 41, -45))[0])
    # Sketch16 → Cut-Extrude11 direction 2 (cut, up to the picked face)
    with BuildSketch(Plane.XY, mode=Mode.PRIVATE) as cut_extrude11_direction_2_sk1:
        Polygon((45, 57.006357685), (-45, 57.006357685), (-45, 83), (-13, 83), (-13, 67.006357685), (13, 67.006357685), (13, 83), (45, 83), align=None)
    cut_extrude11_direction_2_tool1 = split(extrude(cut_extrude11_direction_2_sk1.sketch, amount=-CUT_EXTRUDE11_DIRECTION_2_REACH, mode=Mode.PRIVATE), bisect_by=cut_extrude11_direction_2_end, keep=Keep.BOTH, mode=Mode.PRIVATE)
    add(cut_extrude11_direction_2_tool1.solids().sort_by(Axis((0, 57.943143, 0), (0, 0, -1)))[0], mode=Mode.SUBTRACT)

    # Chamfer3
    chamfer3_edges = [part.edges().sort_by_distance(p)[0] for p in [
        (13, 70, 0),
        (-13, 70, 0),
    ]]
    chamfer(chamfer3_edges, length=CHAMFER3_SIZE)

    # Sketch17 → Cut-Extrude12 (cut, through all)
    with BuildSketch(Plane(origin=(51, 0, 0), x_dir=(0, 0, -1), z_dir=(1, 0, 0))):
        with Locations((0, 15.982440543)):
            Rectangle(SKETCH17_W, SKETCH17_H)
    extrude(amount=-CUT_EXTRUDE12_DEPTH, mode=Mode.SUBTRACT)

    # Sketch19 → Cut-Extrude14 (cut)
    with BuildSketch(Plane.XZ.offset(-42.5)):
        Rectangle(SKETCH19_W, SKETCH19_H)
    extrude(amount=-CUT_EXTRUDE14_DEPTH, mode=Mode.SUBTRACT)

    # Sketch20 → Cut-Extrude15 (cut, through all)
    with BuildSketch(Plane(origin=(50, 0, 0), x_dir=(0, 0, -1), z_dir=(1, 0, 0))):
        with Locations((0, 47.5)):
            Circle(SKETCH20_R)
    extrude(amount=-CUT_EXTRUDE15_DEPTH, mode=Mode.SUBTRACT)

    # Sketch21 → Cut-Extrude16 (cut, through all)
    with BuildSketch(Plane(origin=(0, 0, -50), x_dir=(-1, 0, 0), z_dir=(0, 0, -1))):
        with Locations((0, 47.5)):
            Circle(SKETCH21_R)
    extrude(amount=-CUT_EXTRUDE16_DEPTH, mode=Mode.SUBTRACT)


solid = part.part
